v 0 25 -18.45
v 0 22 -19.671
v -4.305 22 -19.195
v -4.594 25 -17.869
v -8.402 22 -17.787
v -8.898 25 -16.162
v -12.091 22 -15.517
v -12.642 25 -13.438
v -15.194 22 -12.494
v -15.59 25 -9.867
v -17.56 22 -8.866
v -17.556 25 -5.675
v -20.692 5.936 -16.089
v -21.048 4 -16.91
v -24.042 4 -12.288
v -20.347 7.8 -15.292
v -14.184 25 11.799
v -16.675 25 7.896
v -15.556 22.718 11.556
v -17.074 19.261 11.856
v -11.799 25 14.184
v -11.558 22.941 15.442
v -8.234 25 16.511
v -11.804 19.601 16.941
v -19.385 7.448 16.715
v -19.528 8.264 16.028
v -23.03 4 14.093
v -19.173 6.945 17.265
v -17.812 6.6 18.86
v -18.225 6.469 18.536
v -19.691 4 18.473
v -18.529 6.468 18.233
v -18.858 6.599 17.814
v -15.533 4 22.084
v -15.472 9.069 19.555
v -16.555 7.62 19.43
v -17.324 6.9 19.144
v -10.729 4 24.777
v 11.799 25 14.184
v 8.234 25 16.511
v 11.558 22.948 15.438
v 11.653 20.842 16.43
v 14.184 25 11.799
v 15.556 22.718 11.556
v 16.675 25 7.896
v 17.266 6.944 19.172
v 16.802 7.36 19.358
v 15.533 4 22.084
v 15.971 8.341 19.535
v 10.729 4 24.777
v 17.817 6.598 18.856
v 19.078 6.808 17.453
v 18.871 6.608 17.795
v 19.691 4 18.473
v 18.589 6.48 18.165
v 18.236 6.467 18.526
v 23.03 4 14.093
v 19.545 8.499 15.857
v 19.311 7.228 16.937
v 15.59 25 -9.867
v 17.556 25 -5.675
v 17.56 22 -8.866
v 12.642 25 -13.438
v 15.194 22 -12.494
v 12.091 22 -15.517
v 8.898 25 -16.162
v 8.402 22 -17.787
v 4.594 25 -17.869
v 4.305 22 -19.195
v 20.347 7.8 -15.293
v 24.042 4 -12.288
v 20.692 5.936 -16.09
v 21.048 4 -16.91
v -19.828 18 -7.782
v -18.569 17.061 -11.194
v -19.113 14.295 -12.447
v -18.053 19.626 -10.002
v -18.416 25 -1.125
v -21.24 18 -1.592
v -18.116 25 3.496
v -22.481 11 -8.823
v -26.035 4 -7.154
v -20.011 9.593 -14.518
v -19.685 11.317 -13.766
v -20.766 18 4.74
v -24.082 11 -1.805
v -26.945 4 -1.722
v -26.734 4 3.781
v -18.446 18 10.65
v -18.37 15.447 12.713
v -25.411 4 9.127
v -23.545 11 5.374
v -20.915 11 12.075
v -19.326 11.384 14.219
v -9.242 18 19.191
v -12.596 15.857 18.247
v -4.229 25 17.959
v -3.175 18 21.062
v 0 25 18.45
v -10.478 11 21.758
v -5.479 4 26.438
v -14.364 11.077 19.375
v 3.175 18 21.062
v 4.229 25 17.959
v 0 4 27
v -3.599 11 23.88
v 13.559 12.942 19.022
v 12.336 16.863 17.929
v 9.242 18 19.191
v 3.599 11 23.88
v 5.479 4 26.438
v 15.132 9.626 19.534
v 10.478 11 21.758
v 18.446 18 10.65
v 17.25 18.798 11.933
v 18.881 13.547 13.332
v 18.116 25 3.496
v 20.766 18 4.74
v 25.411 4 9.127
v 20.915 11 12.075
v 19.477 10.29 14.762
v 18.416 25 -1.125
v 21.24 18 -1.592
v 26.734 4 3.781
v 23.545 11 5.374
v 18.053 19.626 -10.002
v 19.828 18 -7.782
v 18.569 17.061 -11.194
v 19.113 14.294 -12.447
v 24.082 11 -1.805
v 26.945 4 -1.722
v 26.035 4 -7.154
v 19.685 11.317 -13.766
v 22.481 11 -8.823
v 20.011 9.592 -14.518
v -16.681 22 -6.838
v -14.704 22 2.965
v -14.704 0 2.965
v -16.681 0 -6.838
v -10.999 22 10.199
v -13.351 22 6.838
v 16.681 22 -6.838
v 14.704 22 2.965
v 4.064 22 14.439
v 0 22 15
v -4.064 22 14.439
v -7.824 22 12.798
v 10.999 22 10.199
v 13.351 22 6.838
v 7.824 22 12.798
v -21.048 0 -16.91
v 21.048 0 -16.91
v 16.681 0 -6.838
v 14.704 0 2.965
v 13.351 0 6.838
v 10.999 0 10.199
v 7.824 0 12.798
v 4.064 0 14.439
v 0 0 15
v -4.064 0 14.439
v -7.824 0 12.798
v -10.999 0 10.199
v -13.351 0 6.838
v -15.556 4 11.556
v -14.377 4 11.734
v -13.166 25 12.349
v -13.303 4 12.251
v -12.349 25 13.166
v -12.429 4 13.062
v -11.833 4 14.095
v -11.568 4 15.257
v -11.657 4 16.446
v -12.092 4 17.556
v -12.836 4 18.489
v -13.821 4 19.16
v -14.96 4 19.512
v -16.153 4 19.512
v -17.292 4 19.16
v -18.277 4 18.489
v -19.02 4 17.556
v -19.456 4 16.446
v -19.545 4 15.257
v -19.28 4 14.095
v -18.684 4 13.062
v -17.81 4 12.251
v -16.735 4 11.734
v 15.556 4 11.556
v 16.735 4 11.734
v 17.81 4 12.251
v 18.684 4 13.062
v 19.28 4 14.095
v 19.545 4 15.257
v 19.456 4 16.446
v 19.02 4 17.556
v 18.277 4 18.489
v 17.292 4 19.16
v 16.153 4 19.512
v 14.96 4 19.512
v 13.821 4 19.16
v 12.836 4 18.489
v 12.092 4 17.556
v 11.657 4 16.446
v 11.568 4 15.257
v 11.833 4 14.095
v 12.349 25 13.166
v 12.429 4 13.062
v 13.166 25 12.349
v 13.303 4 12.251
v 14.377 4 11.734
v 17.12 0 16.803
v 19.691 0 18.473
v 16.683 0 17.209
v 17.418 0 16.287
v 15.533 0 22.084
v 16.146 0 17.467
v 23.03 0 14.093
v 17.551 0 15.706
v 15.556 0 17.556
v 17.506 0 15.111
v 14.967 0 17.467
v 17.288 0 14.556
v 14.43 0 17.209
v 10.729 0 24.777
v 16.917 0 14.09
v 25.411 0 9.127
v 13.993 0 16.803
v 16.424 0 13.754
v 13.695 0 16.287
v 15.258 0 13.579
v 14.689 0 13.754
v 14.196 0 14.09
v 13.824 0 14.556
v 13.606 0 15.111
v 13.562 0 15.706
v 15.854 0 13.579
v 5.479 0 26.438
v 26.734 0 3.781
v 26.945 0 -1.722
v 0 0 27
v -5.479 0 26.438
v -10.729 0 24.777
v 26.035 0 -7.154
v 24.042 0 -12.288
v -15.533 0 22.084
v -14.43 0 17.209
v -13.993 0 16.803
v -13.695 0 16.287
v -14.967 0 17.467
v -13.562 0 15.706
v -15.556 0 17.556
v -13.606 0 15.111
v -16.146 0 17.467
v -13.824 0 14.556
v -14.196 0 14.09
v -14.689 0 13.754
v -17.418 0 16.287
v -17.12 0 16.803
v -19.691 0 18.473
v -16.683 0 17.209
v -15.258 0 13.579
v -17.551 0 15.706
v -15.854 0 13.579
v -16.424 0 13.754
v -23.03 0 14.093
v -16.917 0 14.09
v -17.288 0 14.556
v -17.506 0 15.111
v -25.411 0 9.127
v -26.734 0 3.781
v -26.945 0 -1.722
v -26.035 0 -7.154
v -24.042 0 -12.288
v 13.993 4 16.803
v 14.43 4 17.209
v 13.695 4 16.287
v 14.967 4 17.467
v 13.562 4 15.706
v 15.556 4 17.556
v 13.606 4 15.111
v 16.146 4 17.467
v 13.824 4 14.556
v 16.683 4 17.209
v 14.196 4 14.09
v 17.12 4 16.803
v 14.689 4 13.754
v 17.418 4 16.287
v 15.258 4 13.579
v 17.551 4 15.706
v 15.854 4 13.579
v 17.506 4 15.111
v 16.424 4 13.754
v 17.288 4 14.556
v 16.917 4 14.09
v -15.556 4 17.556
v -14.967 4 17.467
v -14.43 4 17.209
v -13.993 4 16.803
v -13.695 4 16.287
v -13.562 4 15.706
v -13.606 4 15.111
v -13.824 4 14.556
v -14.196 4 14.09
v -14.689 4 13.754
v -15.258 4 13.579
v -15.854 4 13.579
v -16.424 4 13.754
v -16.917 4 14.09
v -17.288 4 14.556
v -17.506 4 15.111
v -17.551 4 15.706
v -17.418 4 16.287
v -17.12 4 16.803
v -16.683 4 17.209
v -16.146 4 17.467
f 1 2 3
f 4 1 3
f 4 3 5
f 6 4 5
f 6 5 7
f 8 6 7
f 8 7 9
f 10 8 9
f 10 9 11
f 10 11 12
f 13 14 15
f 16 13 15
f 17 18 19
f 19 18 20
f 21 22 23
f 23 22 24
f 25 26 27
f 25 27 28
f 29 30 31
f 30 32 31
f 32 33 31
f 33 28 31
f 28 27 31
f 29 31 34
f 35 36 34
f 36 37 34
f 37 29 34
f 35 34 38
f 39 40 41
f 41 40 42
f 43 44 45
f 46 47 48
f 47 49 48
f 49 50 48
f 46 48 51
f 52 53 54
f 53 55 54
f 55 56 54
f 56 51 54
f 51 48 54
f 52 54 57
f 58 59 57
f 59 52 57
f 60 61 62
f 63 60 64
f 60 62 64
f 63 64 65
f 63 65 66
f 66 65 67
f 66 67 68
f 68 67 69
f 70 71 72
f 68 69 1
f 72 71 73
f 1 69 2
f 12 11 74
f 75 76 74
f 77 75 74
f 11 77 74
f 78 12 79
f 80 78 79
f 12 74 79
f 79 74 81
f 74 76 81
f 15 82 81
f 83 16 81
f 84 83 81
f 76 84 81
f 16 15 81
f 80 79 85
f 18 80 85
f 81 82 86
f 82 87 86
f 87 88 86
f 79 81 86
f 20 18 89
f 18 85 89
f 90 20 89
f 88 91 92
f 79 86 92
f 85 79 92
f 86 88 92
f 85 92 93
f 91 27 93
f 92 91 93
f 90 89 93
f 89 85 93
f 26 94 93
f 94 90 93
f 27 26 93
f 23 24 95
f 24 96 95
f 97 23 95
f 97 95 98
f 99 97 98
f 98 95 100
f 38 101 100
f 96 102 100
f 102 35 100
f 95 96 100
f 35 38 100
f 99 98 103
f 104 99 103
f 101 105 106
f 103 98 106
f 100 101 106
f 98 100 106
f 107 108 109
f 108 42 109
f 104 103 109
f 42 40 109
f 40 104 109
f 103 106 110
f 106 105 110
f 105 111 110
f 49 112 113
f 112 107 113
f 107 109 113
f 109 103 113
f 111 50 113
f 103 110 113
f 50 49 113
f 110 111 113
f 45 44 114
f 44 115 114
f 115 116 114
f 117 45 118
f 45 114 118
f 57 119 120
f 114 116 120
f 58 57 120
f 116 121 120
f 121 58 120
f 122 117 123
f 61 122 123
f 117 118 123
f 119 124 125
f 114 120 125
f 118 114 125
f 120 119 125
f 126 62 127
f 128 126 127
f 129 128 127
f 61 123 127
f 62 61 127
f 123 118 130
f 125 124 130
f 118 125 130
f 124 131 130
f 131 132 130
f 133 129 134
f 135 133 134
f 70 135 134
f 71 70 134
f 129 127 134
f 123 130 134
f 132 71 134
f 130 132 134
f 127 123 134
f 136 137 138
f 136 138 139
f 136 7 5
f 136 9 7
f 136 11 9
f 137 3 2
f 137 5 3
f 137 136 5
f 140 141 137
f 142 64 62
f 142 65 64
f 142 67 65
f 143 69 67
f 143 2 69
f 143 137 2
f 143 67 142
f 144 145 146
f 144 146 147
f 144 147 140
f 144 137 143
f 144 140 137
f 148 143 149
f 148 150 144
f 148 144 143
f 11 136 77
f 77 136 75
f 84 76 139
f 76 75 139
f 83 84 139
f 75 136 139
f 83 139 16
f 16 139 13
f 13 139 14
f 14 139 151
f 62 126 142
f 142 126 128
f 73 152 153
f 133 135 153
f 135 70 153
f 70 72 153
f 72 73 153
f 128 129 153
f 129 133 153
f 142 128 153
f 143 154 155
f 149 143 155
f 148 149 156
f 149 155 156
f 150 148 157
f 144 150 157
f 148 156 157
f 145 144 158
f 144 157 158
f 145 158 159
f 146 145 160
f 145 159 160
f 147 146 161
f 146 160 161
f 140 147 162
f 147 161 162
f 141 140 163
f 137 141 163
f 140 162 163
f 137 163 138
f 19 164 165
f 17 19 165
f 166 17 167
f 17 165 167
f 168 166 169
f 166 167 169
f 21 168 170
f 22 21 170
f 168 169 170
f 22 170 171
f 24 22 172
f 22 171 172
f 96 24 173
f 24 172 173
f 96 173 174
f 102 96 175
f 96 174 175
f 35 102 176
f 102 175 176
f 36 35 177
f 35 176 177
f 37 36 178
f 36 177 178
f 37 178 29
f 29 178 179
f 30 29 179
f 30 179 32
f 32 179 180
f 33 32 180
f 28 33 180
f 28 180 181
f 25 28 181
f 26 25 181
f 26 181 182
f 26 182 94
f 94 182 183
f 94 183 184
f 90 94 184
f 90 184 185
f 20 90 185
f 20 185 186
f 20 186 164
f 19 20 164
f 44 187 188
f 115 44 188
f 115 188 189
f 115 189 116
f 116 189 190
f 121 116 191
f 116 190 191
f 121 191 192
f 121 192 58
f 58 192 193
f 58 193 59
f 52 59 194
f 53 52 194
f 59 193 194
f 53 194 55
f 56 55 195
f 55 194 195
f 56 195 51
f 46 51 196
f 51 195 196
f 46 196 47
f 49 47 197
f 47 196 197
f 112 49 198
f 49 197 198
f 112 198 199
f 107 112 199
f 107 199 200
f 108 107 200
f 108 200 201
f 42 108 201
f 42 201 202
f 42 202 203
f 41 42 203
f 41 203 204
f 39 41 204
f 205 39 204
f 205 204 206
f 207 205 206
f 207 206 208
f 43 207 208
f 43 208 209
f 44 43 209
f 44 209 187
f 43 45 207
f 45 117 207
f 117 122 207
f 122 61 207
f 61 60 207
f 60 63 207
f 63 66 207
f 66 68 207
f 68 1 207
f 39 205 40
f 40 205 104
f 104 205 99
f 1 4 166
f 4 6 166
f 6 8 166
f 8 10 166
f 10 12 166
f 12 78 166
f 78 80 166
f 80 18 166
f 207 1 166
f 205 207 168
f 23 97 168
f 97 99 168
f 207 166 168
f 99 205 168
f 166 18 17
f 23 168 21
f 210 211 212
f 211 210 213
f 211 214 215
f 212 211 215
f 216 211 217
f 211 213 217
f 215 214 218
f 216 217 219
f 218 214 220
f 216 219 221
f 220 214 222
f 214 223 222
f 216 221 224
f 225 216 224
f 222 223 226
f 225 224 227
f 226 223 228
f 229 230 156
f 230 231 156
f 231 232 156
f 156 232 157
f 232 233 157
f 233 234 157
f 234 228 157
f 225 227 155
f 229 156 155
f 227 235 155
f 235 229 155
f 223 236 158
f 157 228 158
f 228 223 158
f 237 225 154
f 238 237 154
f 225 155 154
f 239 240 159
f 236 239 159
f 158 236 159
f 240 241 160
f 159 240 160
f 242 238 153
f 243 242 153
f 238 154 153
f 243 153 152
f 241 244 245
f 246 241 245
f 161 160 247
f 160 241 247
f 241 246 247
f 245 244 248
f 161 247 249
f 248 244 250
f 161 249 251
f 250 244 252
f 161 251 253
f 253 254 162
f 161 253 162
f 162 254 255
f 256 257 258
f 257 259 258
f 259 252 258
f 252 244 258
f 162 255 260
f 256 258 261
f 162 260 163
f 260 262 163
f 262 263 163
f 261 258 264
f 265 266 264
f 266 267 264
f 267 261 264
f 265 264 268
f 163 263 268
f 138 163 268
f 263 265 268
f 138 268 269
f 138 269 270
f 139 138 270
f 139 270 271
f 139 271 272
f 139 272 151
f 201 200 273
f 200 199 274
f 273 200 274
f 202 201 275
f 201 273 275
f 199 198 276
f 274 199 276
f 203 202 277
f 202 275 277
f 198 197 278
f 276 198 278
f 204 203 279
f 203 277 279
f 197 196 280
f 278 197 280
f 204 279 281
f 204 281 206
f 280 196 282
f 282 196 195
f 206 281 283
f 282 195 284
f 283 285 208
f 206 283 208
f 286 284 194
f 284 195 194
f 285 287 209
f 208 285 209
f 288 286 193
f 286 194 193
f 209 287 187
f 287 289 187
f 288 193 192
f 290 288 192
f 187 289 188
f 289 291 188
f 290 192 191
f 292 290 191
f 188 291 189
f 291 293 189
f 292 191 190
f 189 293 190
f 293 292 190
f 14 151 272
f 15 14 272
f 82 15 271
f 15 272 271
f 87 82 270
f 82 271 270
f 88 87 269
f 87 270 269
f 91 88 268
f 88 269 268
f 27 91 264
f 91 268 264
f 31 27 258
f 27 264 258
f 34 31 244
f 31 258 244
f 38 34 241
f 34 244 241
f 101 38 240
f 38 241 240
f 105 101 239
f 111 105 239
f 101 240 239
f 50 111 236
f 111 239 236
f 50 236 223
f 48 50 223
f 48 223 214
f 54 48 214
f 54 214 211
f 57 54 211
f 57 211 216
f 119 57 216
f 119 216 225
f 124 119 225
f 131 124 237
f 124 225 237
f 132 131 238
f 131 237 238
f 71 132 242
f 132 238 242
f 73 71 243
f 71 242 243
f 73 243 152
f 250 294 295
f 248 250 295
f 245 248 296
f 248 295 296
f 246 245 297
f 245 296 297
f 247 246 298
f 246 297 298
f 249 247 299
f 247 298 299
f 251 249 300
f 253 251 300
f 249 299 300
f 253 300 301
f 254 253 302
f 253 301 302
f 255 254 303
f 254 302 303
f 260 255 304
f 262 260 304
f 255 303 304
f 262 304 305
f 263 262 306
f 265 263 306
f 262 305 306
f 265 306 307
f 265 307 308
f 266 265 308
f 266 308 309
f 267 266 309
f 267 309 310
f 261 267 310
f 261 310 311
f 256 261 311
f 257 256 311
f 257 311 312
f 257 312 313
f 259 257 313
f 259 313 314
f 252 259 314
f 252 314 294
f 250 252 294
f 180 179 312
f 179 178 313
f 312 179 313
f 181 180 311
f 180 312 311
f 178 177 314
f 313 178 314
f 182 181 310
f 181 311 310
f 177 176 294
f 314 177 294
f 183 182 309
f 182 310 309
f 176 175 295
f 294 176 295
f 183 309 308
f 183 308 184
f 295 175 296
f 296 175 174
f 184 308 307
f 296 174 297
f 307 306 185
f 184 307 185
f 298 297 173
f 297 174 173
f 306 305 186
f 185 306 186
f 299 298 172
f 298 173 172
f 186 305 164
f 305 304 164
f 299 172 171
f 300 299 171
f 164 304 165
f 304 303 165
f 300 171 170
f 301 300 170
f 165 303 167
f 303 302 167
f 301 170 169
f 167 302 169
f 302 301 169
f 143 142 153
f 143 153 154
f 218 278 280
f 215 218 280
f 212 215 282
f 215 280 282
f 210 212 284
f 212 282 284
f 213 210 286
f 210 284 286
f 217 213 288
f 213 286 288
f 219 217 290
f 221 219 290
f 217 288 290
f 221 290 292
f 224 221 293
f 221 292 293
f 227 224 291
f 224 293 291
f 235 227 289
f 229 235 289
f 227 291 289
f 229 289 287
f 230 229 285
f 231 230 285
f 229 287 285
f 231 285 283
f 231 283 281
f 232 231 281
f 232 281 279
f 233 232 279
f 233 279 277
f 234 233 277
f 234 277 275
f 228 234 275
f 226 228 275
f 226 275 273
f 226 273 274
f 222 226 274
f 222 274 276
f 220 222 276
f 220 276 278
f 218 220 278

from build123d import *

# Parameters (mm, degrees)
SKETCH5_R          = 2
CUT_EXTRUDE2_DEPTH = 46.639894829
SKETCH6_R          = 4
CUT_EXTRUDE3_DEPTH = 22
SKETCH7_R          = 4.5
CUT_EXTRUDE4_DEPTH = 22
CUT_EXTRUDE5_DEPTH = 22


with BuildPart() as part:
    # Sketch2 → Revolve1 (revolve)
    with BuildSketch(Plane(origin=(0, 0, 0), x_dir=(0, 0, -1), z_dir=(1, 0, 0))):
        Polygon((-18.45, 25), (-27, 4), (-27, 0), (-15, 0), (-15, 22), (0, 22), (0, 25), align=None)
    revolve(axis=Axis((0, 0, 0), (0, 1, 0)))

    # Sketch5 → Cut-Extrude2 (cut, through all)
    with BuildSketch(Plane(origin=(0, 25, 0), x_dir=(1, 0, 0), z_dir=(0, 1, 0))):
        with Locations((-15.556349186, -15.556349186)):
            Circle(SKETCH5_R)
        with Locations((15.556349186, -15.556349186)):
            Circle(SKETCH5_R)
    extrude(amount=-CUT_EXTRUDE2_DEPTH, mode=Mode.SUBTRACT)

    # Sketch6 → Cut-Extrude3 (cut)
    with BuildSketch(Plane(origin=(0, 4, 0), x_dir=(-1, 0, 0), z_dir=(0, -1, 0))):
        with Locations((15.556349186, -15.556349186)):
            Circle(SKETCH6_R)
        with Locations((-15.556349186, -15.556349186)):
            Circle(SKETCH6_R)
    extrude(amount=-CUT_EXTRUDE3_DEPTH, mode=Mode.SUBTRACT)

    # Sketch7 → Cut-Extrude4 (cut)
    with BuildSketch(Plane(origin=(0, 0, 0), x_dir=(-1, 0, 0), z_dir=(0, -1, 0))):
        with Locations((15.556349186, 15.556349186)):
            Circle(SKETCH7_R)
        with Locations((-15.556349186, 15.556349186)):
            Circle(SKETCH7_R)
    extrude(amount=-CUT_EXTRUDE4_DEPTH, mode=Mode.SUBTRACT)

    # Sketch10 → Cut-Extrude5 (cut)
    with BuildSketch(Plane.XZ):
        with BuildLine():
            Line((-14.704067619, 2.964860106), (-16.680641023, -6.837851641))
            Line((-16.680641023, -6.837851641), (-21.048400418, -16.910494961))
            ThreePointArc((-21.048400418, -16.910494961), (-18.731046773, -19.446024961), (-16.110526631, -21.666816371))
            ThreePointArc((-16.110526631, -21.666816371), (0, -27), (16.110526631, -21.666816371))
            ThreePointArc((16.110526631, -21.666816371), (18.731046773, -19.446024961), (21.048400418, -16.910494961))
            Line((21.048400418, -16.910494961), (16.680641023, -6.837851641))
            Line((16.680641023, -6.837851641), (14.704067619, 2.964860106))
            ThreePointArc((14.704067619, 2.964860106), (0, 15), (-14.704067619, 2.964860106))
        make_face()
    extrude(amount=-CUT_EXTRUDE5_DEPTH, mode=Mode.SUBTRACT)


solid = part.part
